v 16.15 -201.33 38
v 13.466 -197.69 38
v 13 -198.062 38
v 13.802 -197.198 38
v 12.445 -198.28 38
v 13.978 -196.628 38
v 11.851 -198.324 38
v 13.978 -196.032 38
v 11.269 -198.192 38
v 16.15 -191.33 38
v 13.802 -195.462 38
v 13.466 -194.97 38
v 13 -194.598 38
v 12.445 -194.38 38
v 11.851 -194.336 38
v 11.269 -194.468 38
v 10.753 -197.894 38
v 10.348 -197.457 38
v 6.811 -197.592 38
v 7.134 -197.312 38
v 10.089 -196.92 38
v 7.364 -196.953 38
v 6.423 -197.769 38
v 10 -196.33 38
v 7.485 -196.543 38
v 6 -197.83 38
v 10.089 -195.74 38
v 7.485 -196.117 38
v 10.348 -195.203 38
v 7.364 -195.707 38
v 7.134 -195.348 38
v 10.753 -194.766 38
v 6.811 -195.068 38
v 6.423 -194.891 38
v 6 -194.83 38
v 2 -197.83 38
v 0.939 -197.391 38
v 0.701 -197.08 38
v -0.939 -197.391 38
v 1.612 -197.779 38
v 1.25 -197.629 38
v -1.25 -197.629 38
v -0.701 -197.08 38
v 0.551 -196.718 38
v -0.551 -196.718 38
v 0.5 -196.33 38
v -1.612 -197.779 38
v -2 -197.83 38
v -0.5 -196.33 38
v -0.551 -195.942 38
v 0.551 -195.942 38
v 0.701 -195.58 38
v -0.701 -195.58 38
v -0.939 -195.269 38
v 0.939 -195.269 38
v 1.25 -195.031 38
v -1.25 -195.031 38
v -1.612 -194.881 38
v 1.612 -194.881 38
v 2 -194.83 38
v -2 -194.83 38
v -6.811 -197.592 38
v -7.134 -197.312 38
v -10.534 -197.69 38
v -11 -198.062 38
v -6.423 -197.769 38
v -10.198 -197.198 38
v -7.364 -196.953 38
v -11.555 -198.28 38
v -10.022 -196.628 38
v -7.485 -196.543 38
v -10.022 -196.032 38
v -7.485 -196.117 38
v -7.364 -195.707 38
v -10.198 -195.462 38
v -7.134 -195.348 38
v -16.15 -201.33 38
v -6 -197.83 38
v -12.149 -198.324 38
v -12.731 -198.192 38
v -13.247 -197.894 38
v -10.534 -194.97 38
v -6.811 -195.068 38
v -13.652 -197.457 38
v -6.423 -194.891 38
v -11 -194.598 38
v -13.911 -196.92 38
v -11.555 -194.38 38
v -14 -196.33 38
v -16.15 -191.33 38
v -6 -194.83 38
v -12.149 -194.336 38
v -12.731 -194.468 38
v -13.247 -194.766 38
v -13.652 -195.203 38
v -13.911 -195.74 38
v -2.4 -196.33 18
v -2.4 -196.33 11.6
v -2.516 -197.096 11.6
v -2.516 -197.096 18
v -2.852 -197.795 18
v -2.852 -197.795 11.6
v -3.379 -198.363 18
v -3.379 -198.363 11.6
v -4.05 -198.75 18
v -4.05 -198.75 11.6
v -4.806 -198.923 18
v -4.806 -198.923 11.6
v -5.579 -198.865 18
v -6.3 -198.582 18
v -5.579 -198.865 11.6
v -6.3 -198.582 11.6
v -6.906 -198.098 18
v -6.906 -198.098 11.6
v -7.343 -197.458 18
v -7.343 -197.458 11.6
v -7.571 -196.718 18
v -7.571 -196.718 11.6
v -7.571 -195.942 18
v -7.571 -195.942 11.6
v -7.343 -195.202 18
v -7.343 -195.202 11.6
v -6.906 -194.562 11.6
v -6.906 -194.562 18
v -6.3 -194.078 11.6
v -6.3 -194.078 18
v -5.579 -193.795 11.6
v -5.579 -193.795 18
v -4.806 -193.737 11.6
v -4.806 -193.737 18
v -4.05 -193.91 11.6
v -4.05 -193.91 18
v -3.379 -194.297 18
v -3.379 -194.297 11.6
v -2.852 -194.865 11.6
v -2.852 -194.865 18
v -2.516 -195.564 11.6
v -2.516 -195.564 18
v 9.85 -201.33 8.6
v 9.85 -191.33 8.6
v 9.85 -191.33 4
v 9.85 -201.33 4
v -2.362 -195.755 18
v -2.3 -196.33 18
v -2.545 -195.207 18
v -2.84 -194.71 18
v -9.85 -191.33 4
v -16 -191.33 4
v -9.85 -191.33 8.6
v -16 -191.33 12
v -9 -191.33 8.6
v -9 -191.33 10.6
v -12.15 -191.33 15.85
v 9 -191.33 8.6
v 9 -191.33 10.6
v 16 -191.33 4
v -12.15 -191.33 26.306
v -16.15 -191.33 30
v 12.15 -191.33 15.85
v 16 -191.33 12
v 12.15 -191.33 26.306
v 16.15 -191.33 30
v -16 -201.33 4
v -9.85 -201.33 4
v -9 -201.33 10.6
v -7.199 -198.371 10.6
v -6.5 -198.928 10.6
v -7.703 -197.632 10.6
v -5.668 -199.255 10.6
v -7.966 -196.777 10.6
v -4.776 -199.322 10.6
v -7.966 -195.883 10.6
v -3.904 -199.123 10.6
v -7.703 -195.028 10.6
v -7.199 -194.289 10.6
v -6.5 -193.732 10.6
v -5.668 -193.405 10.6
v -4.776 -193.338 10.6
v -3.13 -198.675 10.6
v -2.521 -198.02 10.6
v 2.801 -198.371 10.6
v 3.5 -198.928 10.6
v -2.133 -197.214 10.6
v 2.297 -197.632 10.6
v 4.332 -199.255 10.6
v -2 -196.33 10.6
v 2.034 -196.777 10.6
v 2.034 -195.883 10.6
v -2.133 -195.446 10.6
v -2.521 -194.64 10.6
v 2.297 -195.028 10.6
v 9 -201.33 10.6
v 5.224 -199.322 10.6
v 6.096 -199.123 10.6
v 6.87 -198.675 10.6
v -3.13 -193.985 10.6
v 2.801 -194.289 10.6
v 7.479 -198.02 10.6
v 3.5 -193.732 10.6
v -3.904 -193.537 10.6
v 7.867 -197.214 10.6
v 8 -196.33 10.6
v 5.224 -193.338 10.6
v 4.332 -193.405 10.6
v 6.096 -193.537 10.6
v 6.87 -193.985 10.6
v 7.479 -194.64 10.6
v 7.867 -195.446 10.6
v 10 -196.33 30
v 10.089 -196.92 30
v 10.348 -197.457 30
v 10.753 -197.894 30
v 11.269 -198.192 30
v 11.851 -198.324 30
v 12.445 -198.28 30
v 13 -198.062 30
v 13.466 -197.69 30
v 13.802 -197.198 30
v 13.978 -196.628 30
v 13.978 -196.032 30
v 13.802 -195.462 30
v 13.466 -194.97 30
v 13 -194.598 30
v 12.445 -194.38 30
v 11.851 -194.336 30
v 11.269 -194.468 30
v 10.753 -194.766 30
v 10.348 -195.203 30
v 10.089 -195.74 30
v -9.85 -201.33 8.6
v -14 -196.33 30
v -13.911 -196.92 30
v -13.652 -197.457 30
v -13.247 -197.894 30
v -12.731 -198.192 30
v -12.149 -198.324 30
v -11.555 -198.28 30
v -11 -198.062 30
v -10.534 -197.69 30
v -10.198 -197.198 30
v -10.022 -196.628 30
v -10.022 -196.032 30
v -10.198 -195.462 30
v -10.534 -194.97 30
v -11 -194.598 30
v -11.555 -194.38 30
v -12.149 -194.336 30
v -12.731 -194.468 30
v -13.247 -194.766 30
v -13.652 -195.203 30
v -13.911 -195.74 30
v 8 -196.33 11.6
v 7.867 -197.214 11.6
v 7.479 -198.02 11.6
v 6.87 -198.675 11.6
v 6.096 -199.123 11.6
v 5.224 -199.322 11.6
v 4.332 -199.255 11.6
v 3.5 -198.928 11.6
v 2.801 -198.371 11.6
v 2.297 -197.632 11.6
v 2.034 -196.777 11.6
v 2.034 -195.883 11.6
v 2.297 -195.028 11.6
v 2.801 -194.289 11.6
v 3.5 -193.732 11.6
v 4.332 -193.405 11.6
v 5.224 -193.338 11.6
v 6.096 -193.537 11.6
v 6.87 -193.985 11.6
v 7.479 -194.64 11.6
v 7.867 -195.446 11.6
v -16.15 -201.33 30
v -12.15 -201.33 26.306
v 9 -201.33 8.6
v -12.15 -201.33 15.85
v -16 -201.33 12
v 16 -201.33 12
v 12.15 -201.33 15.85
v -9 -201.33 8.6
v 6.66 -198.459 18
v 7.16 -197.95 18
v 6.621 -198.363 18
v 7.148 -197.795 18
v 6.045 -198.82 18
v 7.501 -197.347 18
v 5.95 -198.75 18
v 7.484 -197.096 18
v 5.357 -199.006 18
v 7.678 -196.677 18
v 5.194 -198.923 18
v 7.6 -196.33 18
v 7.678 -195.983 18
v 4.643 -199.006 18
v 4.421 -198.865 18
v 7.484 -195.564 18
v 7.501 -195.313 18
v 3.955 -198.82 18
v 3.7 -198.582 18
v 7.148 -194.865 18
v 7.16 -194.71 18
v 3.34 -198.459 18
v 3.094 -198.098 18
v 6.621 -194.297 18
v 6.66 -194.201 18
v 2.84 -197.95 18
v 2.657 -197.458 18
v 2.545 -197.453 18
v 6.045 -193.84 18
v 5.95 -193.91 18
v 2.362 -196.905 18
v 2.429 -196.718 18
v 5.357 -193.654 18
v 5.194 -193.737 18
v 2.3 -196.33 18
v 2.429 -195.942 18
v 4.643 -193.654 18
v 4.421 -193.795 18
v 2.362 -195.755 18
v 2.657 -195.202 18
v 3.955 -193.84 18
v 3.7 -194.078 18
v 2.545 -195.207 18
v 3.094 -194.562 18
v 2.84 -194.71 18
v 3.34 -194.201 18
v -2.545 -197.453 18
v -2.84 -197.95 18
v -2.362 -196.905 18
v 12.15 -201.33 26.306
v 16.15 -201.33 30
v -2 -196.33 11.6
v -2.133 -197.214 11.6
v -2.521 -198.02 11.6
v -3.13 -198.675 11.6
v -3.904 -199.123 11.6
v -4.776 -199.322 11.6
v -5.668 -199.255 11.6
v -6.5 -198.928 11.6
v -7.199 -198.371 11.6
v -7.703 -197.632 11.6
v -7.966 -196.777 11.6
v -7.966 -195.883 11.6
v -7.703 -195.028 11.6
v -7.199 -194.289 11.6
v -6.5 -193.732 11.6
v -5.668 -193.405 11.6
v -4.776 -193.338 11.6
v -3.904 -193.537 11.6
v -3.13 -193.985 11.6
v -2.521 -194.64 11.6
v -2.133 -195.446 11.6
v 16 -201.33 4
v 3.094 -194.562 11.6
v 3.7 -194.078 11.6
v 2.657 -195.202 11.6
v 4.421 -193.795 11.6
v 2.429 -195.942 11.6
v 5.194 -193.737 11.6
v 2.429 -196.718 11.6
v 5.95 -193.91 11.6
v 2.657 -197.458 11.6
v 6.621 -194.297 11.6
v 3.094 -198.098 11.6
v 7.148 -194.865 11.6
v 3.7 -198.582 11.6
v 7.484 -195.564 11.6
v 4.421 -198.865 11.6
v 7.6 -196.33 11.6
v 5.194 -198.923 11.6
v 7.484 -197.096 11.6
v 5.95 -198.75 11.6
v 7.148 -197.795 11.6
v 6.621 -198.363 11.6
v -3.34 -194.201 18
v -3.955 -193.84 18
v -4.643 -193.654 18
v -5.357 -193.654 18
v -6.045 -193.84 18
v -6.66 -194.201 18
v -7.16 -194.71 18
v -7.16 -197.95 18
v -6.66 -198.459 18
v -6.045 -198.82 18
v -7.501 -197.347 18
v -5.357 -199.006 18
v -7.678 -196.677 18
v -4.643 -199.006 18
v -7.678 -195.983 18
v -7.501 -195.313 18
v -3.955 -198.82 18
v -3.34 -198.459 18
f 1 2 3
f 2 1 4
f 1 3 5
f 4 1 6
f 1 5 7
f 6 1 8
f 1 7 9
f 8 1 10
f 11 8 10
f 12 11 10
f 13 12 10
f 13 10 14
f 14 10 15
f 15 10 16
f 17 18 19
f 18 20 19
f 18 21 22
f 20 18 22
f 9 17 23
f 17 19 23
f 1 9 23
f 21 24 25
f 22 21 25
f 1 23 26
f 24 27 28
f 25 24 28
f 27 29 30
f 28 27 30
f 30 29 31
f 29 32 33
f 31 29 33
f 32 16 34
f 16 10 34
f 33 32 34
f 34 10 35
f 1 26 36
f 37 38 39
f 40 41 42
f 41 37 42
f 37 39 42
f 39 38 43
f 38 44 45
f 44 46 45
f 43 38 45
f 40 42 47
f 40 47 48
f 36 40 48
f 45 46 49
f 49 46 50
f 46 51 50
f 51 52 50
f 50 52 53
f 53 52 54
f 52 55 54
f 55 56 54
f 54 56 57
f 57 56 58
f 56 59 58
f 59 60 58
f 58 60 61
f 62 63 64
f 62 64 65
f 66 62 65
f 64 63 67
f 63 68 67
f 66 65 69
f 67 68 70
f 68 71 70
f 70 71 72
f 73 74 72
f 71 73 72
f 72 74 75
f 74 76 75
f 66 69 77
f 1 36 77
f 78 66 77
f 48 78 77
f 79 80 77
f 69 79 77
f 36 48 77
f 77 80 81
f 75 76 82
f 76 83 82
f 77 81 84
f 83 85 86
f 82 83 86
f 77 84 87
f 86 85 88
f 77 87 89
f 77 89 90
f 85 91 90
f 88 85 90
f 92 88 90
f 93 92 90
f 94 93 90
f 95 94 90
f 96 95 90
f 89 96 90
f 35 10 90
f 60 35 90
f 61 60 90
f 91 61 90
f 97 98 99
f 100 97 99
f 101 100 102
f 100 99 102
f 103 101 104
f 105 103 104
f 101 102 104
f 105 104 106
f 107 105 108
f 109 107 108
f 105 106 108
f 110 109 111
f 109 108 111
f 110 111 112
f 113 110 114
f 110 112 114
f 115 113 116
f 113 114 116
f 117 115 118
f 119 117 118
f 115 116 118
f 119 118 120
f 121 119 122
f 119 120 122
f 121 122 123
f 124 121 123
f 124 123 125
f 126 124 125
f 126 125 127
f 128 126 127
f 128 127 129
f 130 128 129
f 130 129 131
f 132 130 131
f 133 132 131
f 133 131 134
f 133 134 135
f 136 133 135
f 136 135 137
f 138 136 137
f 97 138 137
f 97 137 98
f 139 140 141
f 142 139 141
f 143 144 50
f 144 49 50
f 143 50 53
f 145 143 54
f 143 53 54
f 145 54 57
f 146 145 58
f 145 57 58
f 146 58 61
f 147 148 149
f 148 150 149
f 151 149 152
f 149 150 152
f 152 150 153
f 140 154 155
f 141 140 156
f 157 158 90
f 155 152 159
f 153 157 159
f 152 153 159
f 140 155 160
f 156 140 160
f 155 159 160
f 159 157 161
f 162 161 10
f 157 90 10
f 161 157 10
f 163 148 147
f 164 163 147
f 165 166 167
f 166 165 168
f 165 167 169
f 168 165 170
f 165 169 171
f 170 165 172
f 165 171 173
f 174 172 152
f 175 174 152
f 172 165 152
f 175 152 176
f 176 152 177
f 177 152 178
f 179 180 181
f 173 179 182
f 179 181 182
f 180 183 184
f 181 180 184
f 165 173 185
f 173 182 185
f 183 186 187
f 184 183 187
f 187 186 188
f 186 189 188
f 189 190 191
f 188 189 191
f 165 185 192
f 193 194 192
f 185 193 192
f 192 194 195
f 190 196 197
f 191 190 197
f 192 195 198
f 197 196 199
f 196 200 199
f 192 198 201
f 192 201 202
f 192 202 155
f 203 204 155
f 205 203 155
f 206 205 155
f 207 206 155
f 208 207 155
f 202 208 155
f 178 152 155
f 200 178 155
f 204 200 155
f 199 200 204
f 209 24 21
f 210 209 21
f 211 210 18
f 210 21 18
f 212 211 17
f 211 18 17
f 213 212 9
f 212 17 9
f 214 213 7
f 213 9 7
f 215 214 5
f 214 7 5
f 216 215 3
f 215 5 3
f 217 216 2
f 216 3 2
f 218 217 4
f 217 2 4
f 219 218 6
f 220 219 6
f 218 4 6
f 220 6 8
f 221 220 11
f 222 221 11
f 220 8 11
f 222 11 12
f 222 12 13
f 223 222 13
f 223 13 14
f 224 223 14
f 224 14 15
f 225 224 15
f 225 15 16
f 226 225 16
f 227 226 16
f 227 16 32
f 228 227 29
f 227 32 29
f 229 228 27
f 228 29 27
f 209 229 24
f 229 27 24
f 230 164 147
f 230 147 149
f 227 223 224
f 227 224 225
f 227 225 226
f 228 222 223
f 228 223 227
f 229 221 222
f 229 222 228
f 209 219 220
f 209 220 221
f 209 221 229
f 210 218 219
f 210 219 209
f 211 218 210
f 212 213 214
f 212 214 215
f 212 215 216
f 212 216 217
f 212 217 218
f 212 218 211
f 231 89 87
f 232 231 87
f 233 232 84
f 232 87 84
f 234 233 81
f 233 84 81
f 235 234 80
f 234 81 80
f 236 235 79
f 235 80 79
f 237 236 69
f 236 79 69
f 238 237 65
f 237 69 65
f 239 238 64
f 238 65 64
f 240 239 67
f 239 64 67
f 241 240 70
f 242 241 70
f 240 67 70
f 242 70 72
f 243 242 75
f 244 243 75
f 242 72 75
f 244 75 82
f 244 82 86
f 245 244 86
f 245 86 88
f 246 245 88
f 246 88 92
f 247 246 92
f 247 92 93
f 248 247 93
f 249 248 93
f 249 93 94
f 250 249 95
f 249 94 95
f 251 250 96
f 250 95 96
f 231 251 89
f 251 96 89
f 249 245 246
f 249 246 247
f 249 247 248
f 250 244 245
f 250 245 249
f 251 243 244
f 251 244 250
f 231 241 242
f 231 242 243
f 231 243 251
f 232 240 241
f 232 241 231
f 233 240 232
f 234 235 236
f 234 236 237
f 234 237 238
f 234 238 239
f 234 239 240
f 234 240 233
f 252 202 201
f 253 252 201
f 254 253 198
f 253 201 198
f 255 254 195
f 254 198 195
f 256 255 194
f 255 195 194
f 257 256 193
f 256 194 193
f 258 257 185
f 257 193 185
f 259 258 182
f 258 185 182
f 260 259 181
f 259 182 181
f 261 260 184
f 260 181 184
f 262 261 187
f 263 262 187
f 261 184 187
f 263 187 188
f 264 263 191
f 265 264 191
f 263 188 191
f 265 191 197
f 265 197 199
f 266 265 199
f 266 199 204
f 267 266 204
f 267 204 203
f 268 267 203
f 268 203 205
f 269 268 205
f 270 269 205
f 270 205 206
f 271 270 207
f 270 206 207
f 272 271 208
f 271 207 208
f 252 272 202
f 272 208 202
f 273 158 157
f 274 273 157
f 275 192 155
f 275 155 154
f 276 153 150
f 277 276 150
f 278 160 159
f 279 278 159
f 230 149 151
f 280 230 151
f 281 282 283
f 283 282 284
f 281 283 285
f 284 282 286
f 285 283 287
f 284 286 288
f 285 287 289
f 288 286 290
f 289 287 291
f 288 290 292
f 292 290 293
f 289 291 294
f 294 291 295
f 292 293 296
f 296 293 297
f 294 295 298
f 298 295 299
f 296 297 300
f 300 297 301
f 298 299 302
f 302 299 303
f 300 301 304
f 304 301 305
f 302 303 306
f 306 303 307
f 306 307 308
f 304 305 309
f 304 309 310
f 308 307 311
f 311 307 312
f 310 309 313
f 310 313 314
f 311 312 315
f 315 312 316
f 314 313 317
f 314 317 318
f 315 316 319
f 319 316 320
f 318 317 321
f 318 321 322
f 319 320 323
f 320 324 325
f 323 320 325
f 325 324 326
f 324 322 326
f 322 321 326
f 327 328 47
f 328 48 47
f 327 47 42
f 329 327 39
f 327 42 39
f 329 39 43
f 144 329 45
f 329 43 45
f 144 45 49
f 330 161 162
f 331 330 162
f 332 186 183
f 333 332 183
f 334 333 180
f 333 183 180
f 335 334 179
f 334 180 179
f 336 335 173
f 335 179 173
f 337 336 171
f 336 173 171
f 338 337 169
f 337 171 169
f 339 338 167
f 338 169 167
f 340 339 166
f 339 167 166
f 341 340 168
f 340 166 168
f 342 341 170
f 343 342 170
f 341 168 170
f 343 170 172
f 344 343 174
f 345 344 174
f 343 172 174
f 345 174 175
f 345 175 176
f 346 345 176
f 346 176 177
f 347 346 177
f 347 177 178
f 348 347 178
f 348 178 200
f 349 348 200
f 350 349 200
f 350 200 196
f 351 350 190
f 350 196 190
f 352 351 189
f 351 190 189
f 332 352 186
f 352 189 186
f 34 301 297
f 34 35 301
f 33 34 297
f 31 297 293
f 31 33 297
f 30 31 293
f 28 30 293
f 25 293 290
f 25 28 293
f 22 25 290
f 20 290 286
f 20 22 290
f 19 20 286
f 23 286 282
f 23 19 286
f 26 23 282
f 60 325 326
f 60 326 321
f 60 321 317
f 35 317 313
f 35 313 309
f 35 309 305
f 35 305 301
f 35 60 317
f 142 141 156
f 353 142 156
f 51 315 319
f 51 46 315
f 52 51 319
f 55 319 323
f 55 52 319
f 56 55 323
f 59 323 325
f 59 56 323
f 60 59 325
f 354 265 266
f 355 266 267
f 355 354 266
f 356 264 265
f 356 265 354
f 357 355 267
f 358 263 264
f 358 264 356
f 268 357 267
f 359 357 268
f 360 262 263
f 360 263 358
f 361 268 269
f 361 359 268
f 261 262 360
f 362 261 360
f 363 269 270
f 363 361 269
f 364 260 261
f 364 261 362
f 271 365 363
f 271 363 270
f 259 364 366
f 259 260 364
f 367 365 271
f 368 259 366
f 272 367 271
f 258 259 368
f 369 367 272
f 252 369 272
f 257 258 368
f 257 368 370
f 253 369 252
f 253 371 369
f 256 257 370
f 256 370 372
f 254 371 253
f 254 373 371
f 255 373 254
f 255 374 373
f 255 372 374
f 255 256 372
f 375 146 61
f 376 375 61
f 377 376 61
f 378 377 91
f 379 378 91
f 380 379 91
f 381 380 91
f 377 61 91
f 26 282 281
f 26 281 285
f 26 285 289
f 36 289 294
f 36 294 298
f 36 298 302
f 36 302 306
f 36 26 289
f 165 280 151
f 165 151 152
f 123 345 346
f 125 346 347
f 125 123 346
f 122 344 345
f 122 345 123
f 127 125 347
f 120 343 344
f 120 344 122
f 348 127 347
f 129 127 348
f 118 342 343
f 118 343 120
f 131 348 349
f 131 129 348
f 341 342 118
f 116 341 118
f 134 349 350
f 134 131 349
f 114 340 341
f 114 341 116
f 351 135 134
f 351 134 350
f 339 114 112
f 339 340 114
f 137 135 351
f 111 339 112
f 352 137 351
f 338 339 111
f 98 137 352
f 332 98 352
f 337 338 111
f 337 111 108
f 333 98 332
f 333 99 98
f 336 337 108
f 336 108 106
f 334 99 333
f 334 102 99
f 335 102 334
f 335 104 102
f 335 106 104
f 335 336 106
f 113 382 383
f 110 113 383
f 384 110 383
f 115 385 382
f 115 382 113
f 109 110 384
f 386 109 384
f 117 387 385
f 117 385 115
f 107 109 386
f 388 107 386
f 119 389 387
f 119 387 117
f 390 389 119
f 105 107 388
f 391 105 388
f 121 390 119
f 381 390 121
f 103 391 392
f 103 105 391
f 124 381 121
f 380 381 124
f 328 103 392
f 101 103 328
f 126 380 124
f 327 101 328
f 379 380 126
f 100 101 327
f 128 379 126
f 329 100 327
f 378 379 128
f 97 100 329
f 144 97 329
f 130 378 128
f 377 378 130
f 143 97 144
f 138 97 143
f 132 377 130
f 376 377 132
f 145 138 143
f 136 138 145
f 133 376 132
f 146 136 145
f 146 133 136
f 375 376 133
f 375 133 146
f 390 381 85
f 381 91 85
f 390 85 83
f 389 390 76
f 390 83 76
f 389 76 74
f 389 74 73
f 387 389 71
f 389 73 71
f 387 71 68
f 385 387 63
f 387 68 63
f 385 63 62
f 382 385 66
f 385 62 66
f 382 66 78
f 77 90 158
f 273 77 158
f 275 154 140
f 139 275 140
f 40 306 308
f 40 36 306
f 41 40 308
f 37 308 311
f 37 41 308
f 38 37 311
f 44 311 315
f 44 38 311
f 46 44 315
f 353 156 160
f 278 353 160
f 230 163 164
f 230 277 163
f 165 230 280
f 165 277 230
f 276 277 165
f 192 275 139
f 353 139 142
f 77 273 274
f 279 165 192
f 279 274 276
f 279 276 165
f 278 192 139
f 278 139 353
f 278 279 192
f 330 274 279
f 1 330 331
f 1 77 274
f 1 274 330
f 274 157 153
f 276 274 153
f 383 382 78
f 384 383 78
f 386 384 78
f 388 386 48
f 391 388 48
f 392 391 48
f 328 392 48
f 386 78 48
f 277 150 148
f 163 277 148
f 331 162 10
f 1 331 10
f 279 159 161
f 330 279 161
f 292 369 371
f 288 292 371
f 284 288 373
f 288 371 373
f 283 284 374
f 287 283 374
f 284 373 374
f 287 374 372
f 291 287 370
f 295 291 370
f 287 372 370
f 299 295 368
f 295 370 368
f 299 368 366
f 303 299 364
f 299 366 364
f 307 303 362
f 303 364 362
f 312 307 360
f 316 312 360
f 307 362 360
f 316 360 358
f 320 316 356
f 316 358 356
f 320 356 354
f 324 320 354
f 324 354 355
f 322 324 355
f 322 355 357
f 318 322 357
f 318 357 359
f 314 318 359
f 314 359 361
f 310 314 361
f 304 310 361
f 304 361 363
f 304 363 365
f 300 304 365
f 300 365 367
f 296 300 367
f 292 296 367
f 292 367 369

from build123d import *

# Parameters (mm, degrees)
SKETCH066_R     = 2.7
PAD030_DEPTH    = 10
SKETCH063_R     = 2.6
POCKET025_DEPTH = 8
SKETCH064_R     = 3
POCKET026_DEPTH = 1
SKETCH067_R     = 2
POCKET027_DEPTH = 8


with BuildPart() as loft003:
    # Sketch066 → Loft003 section 0
    with BuildSketch(Plane.XY.offset(18)):
        with Locations((-5, 0)):
            Circle(SKETCH066_R)
    # Sketch065 → Loft003 section 1
    with BuildSketch(Plane.XY.offset(38)):
        with BuildLine():
            ThreePointArc((-6, 1.5), (-7.5, 0), (-6, -1.5))
            Line((-6, -1.5), (-2, -1.5))
            ThreePointArc((-2, -1.5), (-0.5, 0), (-2, 1.5))
            Line((-2, 1.5), (-6, 1.5))
        make_face()
    loft()


with BuildPart() as part_mirroring003:
    # Part__Mirroring003: instance of Loft003
    add(loft003.part.mirror(Plane(origin=(0, 0, 0), x_dir=(0, -1, 0), z_dir=(1, 0, 0))))


with BuildPart() as fusion003:
    # Fusion003 base: copy of Loft003
    add(loft003.part)

    # Fusion003: union Part__Mirroring003
    add(part_mirroring003.part)


with BuildPart() as cut002:
    # Sketch062 → Pad030 (new body)
    with BuildSketch(Plane.XZ):
        Polygon((-16, 4), (-9.85, 4), (-9.85, 7), (-9.85, 8.6), (-9, 8.6), (-9, 10.6), (9, 10.6), (9, 8.6), (9.85, 8.6), (9.85, 7), (9.85, 4), (16, 4), (16, 12), (12.15, 15.85), (12.15, 26.306086), (16.15, 30), (16.15, 38), (-16.15, 38), (-16.15, 30), (-12.15, 26.306086), (-12.15, 15.85), (-16, 12), align=None)
    extrude(amount=PAD030_DEPTH)

    # Sketch063 (on Face7 of Pad030) → Pocket025 (cut)
    with BuildSketch(Plane(origin=(0, 0, 10.6), x_dir=(1, 0, 0), z_dir=(0, 0, -1))):
        with Locations((-5, 5)):
            Circle(SKETCH063_R)
        with Locations((5, 5)):
            Circle(SKETCH063_R)
    extrude(amount=-POCKET025_DEPTH, mode=Mode.SUBTRACT)

    # Sketch064 (on Face11 of Pocket025) → Pocket026 (cut)
    with BuildSketch(Plane(origin=(0, 0, 10.6), x_dir=(1, 0, 0), z_dir=(0, 0, -1))):
        with Locations((-5, 5)):
            Circle(SKETCH064_R)
        with Locations((5, 5)):
            Circle(SKETCH064_R)
    extrude(amount=-POCKET026_DEPTH, mode=Mode.SUBTRACT)

    # Sketch067 (on Face22 of Pocket026) → Pocket027 (cut)
    with BuildSketch(Plane(origin=(0, 0, 38), x_dir=(-1, 0, 0), z_dir=(0, 0, 1))):
        with Locations((-12, 5)):
            Circle(SKETCH067_R)
        with Locations((12, 5)):
            Circle(SKETCH067_R)
    extrude(amount=-POCKET027_DEPTH, mode=Mode.SUBTRACT)


with BuildPart() as cut002_1:
    # Body024 placement: moved
    add(cut002.part.moved(Location((0, 5, 0))))

    # Cut002: cut Fusion003
    add(fusion003.part, mode=Mode.SUBTRACT)


with BuildPart() as cut002_2:
    # Cut002 placement: moved
    add(cut002_1.part.moved(Location((0, -196.33, 0))))


solid = cut002_2.part
